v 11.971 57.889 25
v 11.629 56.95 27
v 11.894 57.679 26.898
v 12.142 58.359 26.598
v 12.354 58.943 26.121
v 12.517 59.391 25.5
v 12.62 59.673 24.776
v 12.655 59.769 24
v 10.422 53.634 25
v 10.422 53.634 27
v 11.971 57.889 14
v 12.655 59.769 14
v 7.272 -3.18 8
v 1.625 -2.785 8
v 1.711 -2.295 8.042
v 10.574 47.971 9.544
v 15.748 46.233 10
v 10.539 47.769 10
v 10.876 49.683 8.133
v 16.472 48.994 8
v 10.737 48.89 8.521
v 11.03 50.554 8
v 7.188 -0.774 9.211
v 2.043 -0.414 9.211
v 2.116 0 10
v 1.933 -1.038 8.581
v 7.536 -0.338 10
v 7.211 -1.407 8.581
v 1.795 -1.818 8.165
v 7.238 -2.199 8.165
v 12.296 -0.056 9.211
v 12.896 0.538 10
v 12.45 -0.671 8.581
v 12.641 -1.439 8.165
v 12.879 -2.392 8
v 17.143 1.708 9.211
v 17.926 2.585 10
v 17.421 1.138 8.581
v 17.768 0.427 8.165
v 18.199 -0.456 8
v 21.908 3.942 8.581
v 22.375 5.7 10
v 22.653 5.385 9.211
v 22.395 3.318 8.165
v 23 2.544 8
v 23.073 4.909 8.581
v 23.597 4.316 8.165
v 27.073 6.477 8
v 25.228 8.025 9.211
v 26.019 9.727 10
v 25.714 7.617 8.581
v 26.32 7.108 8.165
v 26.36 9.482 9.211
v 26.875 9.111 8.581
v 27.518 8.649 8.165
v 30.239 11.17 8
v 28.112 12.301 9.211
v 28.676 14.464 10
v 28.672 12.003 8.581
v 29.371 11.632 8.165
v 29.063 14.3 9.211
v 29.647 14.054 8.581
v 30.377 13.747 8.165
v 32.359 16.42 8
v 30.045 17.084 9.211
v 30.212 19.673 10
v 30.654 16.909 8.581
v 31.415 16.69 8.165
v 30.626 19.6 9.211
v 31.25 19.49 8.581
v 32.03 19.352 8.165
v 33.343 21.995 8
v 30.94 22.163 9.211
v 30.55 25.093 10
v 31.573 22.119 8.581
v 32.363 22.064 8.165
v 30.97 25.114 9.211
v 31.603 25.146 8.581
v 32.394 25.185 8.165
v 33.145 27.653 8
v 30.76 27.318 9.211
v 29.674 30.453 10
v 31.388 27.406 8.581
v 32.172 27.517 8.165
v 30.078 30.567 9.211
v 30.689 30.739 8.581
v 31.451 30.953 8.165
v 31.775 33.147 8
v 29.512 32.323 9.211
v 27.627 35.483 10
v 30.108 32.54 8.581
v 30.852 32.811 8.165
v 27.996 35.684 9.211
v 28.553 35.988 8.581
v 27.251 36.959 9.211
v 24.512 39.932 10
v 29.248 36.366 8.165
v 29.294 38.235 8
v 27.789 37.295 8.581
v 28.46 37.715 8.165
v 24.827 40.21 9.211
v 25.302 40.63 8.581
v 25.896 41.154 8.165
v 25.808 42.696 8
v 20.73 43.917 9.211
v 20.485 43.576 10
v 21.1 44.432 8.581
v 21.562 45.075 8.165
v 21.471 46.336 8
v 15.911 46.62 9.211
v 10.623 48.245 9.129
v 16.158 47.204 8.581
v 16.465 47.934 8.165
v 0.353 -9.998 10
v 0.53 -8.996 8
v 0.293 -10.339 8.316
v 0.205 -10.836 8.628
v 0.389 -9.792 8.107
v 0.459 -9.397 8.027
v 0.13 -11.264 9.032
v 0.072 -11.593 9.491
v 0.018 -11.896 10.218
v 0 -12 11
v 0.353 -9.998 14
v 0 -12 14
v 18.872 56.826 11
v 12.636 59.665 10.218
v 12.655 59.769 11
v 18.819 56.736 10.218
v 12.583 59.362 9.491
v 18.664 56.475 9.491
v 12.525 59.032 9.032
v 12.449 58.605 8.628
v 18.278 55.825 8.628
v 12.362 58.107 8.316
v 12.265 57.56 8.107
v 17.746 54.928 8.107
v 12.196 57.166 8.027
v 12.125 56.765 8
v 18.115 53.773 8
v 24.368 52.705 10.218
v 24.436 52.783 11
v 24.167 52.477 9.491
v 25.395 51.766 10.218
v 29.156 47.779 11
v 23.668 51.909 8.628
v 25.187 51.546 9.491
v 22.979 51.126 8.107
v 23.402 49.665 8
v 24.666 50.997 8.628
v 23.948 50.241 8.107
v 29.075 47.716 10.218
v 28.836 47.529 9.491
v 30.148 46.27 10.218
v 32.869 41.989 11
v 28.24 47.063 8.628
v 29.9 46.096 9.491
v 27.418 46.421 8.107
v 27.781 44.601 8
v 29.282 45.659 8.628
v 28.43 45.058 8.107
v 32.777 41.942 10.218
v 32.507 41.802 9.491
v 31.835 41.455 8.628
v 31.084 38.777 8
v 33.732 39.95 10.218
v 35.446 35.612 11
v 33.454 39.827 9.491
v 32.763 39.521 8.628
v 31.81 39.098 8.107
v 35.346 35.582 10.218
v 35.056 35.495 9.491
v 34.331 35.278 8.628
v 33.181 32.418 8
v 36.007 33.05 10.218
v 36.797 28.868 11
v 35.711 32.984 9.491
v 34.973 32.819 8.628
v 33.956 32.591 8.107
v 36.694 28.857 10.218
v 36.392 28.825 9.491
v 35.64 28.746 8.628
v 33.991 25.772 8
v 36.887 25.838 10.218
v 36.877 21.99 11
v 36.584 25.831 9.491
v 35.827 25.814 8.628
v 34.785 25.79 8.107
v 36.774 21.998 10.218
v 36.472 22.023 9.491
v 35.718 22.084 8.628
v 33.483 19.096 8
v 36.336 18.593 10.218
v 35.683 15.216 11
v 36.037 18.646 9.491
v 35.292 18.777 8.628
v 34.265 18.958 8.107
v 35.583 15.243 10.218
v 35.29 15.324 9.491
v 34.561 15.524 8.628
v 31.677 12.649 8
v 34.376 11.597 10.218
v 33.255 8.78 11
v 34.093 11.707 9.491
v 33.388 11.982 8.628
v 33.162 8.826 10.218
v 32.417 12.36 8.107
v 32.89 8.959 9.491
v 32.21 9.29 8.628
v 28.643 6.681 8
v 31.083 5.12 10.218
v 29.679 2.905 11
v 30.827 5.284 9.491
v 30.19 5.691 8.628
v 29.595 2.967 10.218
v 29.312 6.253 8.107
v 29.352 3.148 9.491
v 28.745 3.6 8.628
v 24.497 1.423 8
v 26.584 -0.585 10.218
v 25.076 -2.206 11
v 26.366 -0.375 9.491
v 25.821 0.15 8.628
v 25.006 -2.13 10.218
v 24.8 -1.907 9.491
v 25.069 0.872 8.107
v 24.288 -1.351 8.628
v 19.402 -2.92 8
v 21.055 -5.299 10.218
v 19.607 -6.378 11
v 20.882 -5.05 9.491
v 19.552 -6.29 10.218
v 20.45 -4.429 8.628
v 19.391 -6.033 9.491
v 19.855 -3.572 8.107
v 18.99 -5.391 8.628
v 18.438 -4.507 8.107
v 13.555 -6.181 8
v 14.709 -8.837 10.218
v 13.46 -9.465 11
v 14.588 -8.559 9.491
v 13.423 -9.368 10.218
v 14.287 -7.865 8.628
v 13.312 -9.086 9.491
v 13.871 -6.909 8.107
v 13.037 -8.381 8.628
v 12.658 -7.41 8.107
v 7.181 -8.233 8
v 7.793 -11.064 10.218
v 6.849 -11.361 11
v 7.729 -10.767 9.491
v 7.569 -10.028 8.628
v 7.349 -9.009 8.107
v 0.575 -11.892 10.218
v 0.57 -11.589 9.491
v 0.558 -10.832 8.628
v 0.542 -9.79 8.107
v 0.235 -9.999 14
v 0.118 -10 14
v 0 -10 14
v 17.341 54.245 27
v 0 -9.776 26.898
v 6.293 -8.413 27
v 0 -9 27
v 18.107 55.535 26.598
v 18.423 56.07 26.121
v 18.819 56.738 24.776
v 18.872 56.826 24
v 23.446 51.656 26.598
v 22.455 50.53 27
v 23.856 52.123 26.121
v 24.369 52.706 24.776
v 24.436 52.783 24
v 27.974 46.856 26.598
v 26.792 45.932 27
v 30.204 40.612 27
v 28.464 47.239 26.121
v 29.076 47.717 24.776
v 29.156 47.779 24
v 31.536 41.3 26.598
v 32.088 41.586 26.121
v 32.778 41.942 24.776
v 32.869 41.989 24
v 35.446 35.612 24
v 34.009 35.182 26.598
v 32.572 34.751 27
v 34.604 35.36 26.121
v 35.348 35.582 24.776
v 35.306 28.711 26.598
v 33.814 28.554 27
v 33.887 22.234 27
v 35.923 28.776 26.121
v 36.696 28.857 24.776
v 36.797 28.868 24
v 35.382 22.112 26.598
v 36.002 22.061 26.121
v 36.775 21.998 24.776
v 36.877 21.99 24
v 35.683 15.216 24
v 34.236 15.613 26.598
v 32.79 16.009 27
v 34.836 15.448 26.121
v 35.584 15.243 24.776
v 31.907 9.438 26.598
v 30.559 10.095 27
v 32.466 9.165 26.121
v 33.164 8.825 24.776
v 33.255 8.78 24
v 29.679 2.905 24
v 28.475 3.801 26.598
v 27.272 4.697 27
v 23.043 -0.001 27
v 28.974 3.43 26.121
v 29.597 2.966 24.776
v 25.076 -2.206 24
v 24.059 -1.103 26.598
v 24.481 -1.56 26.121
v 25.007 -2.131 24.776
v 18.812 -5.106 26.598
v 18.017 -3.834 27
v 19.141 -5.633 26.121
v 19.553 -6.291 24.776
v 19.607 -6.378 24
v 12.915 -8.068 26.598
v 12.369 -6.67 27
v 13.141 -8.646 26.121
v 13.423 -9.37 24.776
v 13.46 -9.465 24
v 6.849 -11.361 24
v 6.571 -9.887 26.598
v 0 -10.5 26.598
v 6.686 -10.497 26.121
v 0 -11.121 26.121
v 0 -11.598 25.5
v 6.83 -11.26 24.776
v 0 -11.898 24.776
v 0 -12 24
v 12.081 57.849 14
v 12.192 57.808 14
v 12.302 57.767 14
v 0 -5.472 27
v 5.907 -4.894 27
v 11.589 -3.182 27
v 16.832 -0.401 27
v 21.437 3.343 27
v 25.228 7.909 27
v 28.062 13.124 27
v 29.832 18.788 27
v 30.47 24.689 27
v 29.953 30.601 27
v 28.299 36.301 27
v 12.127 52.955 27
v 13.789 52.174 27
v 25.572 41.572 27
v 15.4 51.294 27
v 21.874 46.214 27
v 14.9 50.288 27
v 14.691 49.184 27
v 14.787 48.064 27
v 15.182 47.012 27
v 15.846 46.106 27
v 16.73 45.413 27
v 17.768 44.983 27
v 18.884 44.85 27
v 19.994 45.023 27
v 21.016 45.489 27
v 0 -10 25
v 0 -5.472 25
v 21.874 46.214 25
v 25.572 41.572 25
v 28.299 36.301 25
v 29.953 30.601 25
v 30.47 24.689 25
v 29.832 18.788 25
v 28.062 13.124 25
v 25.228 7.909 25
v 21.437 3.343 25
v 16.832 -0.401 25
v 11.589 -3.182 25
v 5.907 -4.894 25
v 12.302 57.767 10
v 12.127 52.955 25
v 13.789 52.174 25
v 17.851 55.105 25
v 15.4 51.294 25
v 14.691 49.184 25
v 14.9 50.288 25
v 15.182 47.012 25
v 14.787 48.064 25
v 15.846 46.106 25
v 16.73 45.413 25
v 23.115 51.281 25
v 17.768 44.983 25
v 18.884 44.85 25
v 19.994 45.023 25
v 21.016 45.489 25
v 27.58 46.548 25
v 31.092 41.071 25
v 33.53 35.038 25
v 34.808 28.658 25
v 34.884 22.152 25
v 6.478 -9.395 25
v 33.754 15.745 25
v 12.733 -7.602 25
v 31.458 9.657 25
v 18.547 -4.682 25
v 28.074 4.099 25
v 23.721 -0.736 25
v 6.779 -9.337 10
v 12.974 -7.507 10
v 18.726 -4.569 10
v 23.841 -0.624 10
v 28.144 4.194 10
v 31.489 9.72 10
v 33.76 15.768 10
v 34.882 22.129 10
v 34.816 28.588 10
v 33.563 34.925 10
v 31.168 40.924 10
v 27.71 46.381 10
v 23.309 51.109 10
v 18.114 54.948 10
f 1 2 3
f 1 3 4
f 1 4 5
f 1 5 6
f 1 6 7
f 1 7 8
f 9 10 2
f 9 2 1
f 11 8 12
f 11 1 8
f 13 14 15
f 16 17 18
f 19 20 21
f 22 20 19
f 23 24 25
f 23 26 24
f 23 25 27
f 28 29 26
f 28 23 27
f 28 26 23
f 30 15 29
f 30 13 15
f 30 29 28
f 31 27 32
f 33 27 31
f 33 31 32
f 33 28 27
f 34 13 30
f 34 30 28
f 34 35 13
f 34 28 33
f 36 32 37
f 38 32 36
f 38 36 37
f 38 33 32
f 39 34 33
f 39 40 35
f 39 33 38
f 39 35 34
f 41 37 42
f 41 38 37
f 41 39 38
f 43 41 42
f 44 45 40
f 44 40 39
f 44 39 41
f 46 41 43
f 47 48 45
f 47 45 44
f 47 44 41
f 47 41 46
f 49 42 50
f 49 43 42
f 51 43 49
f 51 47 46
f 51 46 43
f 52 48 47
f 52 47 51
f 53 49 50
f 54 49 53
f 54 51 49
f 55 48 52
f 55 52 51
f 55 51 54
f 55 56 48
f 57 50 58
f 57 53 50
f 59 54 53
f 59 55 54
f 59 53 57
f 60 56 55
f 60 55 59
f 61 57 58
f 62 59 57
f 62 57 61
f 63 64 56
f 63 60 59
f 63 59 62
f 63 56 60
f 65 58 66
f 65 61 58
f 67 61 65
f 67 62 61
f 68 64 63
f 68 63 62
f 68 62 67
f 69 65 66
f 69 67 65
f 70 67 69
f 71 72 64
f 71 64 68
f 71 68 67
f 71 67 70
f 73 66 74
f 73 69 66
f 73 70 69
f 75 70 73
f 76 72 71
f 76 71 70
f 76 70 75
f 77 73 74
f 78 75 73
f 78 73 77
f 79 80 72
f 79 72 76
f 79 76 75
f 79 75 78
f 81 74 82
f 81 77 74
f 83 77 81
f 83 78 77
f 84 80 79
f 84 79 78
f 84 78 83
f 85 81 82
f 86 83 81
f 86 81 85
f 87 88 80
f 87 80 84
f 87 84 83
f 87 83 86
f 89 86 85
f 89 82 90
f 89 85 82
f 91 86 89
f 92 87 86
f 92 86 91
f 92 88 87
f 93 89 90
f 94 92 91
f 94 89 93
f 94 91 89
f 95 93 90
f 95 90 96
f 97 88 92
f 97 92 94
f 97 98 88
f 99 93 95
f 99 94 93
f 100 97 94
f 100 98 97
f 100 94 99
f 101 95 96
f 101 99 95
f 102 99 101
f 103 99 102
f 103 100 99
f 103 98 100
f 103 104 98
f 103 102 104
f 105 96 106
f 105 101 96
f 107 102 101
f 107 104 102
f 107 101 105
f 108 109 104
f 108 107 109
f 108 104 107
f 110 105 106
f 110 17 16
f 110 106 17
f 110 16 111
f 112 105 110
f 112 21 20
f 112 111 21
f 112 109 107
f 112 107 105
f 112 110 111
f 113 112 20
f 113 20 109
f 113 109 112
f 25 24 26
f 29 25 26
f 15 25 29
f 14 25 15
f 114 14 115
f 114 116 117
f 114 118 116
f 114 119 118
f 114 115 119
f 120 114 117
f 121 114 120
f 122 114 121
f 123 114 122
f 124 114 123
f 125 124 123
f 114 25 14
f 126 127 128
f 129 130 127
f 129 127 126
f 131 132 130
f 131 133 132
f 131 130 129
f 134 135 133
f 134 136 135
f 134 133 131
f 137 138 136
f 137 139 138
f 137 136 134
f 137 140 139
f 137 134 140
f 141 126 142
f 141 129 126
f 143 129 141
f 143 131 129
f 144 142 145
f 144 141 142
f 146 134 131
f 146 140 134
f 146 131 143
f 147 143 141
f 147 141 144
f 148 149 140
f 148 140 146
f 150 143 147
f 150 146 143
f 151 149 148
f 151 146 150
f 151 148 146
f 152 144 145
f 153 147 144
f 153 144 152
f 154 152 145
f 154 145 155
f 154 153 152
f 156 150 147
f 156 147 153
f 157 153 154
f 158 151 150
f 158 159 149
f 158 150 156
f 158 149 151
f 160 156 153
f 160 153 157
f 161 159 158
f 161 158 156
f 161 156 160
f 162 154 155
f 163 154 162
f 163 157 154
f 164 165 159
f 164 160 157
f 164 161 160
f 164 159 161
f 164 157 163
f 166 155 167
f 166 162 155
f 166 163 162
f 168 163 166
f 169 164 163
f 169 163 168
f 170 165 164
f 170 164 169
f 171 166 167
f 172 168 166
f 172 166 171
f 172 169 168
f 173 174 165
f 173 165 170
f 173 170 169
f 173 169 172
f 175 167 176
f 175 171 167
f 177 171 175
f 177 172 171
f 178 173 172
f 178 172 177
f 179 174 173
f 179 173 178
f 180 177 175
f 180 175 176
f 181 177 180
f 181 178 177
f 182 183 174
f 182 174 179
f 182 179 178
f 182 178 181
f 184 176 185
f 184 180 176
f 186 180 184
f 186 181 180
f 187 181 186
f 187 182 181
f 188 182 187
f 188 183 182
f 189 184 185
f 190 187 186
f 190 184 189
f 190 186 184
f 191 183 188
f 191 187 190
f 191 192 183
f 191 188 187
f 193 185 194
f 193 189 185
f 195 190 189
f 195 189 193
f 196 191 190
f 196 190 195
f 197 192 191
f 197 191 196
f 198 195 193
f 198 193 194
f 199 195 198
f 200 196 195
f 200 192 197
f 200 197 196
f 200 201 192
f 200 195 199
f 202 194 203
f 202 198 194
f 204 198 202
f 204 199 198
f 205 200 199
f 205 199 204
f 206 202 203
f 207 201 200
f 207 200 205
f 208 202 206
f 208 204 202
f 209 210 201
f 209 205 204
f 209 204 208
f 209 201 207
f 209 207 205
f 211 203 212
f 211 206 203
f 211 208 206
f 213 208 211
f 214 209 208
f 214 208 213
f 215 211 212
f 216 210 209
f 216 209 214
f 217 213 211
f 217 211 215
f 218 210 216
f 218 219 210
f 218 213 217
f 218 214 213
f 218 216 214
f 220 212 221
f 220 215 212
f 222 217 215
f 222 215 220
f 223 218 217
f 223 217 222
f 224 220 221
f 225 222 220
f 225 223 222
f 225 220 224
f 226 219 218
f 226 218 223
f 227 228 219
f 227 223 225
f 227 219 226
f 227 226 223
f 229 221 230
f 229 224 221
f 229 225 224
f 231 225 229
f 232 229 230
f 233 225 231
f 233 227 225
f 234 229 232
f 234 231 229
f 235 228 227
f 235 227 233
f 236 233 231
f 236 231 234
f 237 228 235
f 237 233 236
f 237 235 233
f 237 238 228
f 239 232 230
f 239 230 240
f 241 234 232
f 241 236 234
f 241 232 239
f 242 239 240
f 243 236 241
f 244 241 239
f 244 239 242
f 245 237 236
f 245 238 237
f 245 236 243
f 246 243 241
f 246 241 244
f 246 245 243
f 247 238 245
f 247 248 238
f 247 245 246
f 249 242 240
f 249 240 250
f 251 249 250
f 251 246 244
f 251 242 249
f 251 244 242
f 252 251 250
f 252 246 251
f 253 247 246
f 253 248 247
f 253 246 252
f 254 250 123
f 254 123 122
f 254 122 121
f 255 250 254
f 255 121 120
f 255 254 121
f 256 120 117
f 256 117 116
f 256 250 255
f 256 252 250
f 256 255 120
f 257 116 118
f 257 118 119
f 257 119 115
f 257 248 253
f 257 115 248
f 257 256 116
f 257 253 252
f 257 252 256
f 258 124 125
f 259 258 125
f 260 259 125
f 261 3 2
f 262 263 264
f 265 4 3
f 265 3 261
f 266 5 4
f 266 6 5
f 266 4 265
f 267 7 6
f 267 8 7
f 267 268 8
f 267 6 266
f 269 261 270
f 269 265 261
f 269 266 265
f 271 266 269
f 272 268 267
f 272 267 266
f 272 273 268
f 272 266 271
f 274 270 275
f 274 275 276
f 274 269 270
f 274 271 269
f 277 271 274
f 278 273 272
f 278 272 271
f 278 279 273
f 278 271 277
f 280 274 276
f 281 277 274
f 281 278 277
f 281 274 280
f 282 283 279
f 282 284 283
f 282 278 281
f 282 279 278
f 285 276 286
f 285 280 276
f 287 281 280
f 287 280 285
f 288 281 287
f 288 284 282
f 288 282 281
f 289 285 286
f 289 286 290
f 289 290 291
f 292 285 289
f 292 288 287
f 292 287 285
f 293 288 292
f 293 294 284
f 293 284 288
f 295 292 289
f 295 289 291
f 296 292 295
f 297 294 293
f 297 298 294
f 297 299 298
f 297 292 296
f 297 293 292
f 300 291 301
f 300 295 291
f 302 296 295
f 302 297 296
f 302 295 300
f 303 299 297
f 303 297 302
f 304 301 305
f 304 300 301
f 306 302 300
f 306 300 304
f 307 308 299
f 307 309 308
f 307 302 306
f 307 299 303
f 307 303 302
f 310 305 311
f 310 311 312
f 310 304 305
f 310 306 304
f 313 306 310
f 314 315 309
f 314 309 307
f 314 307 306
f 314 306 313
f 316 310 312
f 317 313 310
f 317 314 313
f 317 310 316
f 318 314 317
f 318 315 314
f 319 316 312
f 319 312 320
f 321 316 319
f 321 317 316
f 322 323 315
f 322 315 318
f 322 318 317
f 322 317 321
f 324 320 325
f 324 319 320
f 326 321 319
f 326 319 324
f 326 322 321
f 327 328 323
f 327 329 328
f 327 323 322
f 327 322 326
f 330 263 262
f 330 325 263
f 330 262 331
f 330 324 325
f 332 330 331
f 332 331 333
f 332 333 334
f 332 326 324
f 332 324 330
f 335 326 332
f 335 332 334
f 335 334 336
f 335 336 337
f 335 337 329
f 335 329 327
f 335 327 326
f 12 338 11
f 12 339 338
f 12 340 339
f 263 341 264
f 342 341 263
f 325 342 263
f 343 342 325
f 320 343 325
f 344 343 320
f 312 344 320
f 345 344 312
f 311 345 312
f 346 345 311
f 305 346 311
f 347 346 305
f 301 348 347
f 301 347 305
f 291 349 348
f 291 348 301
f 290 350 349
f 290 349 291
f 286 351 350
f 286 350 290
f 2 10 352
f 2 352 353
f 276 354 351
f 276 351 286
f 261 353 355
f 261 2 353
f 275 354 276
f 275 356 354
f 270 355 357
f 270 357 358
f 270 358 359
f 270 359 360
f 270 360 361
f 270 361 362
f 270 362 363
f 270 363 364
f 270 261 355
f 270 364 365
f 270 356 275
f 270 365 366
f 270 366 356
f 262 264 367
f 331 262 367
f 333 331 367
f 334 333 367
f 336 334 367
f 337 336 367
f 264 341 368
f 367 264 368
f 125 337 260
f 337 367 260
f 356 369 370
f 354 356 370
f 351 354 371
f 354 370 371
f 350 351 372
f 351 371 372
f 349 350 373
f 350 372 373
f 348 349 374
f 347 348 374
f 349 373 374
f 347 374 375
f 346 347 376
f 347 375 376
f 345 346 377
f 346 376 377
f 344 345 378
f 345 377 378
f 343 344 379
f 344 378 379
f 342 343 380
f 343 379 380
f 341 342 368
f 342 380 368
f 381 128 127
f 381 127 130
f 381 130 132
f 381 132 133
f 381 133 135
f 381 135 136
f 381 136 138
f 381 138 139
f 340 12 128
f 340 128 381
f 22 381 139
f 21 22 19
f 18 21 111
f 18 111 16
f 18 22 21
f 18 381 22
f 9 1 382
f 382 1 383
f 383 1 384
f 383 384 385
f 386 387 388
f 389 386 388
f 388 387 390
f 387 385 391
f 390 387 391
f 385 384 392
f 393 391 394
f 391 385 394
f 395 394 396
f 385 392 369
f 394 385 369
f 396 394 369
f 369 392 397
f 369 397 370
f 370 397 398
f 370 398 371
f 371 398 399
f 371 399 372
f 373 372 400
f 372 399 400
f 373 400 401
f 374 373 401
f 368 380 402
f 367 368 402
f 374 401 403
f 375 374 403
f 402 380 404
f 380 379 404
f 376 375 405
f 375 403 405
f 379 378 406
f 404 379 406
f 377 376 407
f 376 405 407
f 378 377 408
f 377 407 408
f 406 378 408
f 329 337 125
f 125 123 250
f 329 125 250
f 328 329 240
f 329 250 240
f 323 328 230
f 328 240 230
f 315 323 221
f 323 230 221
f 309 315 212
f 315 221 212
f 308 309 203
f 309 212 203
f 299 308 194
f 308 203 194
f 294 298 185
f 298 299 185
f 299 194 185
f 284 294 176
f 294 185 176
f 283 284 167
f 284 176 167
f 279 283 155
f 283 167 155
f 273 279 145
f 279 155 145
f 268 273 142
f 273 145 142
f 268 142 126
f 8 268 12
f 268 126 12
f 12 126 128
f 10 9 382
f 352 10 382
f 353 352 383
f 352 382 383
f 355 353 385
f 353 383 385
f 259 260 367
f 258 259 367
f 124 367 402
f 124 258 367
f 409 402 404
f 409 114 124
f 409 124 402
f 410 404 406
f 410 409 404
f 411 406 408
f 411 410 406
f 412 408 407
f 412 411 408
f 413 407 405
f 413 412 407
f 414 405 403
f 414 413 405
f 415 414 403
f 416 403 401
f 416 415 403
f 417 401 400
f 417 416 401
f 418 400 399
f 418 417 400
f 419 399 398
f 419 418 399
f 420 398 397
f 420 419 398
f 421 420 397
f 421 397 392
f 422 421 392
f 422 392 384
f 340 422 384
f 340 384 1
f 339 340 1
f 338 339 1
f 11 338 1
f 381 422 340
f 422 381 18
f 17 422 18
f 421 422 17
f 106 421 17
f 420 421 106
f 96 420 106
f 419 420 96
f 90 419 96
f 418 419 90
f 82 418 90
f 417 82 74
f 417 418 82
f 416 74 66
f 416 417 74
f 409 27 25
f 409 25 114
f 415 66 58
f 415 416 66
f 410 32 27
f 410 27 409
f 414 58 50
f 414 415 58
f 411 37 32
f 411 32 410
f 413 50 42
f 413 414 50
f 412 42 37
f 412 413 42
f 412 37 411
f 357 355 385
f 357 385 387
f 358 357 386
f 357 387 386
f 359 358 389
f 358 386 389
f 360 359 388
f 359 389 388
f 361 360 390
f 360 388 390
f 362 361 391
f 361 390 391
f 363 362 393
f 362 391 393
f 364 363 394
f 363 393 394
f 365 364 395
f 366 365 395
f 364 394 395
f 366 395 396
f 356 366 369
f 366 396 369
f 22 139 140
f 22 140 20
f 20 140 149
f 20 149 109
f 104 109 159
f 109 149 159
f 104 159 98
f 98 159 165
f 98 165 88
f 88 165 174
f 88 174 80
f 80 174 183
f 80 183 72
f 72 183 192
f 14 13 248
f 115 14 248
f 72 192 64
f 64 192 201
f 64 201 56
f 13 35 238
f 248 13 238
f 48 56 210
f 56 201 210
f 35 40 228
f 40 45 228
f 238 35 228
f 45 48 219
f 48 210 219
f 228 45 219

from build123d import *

# Parameters (mm, degrees)
SKETCH1_W                = 15
SKETCH1_H                = 35
REVOLVE1_ANGLE           = 160
SHELL1_T                 = 2
CUT_EXTRUDE4_DEPTH       = 73.816816531
CUT_EXTRUDE4_DEPTH_BACK  = 6
CUT_EXTRUDE5_DEPTH       = 73.816816531
CUT_EXTRUDE5_DEPTH_BACK  = 6
BOSS_EXTRUDE1_START      = -2
SKETCH9_R                = 4.124065783
BOSS_EXTRUDE1_DEPTH      = 2
FILLET4_R                = 3
FILLET5_R                = 3
CUT_EXTRUDE15_DEPTH      = 73.816816664
CUT_EXTRUDE15_DEPTH_BACK = 2
FILLET9_R                = 3


with BuildPart() as part:
    # Sketch1 → Revolve1 (revolve)
    with BuildSketch(Plane(origin=(0, 0, 0), x_dir=(0, 0, -1), z_dir=(1, 0, 0))):
        with Locations((-17.5, 7.5)):
            Rectangle(SKETCH1_W, SKETCH1_H)
    revolve(axis=Axis((0, 25, 25), (0, 0, 1)), revolution_arc=REVOLVE1_ANGLE)

    # Shell1
    shell1_openings = [part.faces().sort_by_distance(p)[0] for p in [
        (0, 7.5, 17.5),
        (5.985352508, 41.444620864, 17.5),
    ]]
    offset(amount=SHELL1_T, openings=shell1_openings, kind=Kind.INTERSECTION)

    # Sketch5 → Cut-Extrude4 (cut, two sides: drawn at the far end of the back side and taken through both)
    with BuildSketch(Plane.XY.offset(27).offset(-CUT_EXTRUDE4_DEPTH_BACK)):
        with BuildLine():
            Line((-139.932865383, 108.358884102), (10.421993206, 53.634190998))
            ThreePointArc((10.421993206, 53.634190998), (30.008933424, 19.708615375), (0, -5.471869593))
            Line((0, -5.471869593), (-160.004298494, -5.471869593))
            Line((-160.004298494, -5.471869593), (-475.151245838, 50.097040112))
            Line((-475.151245838, 50.097040112), (-455.079812728, 163.927793806))
            Line((-455.079812728, 163.927793806), (-139.932865383, 108.358884102))
        make_face()
    extrude(amount=CUT_EXTRUDE4_DEPTH + CUT_EXTRUDE4_DEPTH_BACK, mode=Mode.SUBTRACT)

    # Sketch7 → Cut-Extrude5 (cut, two sides: drawn at the far end of the back side and taken through both)
    with BuildSketch(Plane(origin=(0, 0, 8), x_dir=(-1, 0, 0), z_dir=(0, 0, -1)).offset(-CUT_EXTRUDE5_DEPTH_BACK)):
        Polygon((-42.433629983, 228.653074263), (-12.654745303, 59.768626969), (0, -12), (29.77888468, -180.884447294), (367.547779267, -121.326677934), (295.335264604, 288.210843622), align=None)
    extrude(amount=CUT_EXTRUDE5_DEPTH + CUT_EXTRUDE5_DEPTH_BACK, mode=Mode.SUBTRACT)

    # Sketch9 → Boss-Extrude1 (add)
    with BuildSketch(Plane.XY.offset(27).offset(BOSS_EXTRUDE1_START)):
        with Locations((18.809520277, 48.973668543)):
            Circle(SKETCH9_R)
    extrude(amount=BOSS_EXTRUDE1_DEPTH)

    # Fillet4
    fillet4_edges = [part.edges().sort_by_distance(p)[0] for p in [
        (36.437886861, 18.575017426, 27),
    ]]
    fillet(fillet4_edges, radius=FILLET4_R)

    # Fillet5
    fillet5_edges = [part.edges().sort_by_distance(p)[0] for p in [
        (36.437886861, 18.575017426, 8),
    ]]
    fillet(fillet5_edges, radius=FILLET5_R)

    # Sketch13 → Cut-Extrude15 (cut, two sides: drawn at the far end of the back side and taken through both)
    with BuildSketch(Plane(origin=(0, 0, 8), x_dir=(-1, 0, 0), z_dir=(0, 0, -1)).offset(-CUT_EXTRUDE15_DEPTH_BACK)):
        with BuildLine():
            Line((144.037339106, 25.770763563), (-2.115923769, 0))
            ThreePointArc((-2.115923769, 0), (-30.211686136, 19.672864602), (-10.538821535, 47.768626969))
            Line((-10.538821535, 47.768626969), (135.61444134, 73.539390533))
            Line((135.61444134, 73.539390533), (427.92096709, 125.080917659))
            Line((427.92096709, 125.080917659), (436.343864856, 77.31229069))
            Line((436.343864856, 77.31229069), (144.037339106, 25.770763563))
        make_face()
    extrude(amount=CUT_EXTRUDE15_DEPTH + CUT_EXTRUDE15_DEPTH_BACK, mode=Mode.SUBTRACT)

    # Fillet9
    # the kernel refuses this fillet: 3 mm, written as the material it takes off along each edge
    with BuildSketch(Plane(origin=(6.327372652, 23.884313485, 8), x_dir=(-0.44981568414947964, -0.8931214084843873, 0), z_dir=(-0.8931214084843873, 0.44981568414947964, 0))) as fillet9_piece_1:
        with BuildLine():
            CenterArc((27.081194644, 3), FILLET9_R, 199.471220634, 70.528779366)
            Line((24.252767519, 2), (24.196198976, 1.98))
            ThreePointArc((24.196198976, 1.98), (24.192767519, 1), (24.192767519, 0))
            Line((24.192767519, 0), (24.252767519, -0.06))
            Line((24.252767519, -0.06), (27.081194644, -0.06))
            Line((27.081194644, -0.06), (27.081194644, 0))
        make_face()
    revolve(axis=Axis((6.327372652, 23.884313485, 8), (0, 0, 1)), revolution_arc=213.463718105, mode=Mode.SUBTRACT)


solid = part.part
